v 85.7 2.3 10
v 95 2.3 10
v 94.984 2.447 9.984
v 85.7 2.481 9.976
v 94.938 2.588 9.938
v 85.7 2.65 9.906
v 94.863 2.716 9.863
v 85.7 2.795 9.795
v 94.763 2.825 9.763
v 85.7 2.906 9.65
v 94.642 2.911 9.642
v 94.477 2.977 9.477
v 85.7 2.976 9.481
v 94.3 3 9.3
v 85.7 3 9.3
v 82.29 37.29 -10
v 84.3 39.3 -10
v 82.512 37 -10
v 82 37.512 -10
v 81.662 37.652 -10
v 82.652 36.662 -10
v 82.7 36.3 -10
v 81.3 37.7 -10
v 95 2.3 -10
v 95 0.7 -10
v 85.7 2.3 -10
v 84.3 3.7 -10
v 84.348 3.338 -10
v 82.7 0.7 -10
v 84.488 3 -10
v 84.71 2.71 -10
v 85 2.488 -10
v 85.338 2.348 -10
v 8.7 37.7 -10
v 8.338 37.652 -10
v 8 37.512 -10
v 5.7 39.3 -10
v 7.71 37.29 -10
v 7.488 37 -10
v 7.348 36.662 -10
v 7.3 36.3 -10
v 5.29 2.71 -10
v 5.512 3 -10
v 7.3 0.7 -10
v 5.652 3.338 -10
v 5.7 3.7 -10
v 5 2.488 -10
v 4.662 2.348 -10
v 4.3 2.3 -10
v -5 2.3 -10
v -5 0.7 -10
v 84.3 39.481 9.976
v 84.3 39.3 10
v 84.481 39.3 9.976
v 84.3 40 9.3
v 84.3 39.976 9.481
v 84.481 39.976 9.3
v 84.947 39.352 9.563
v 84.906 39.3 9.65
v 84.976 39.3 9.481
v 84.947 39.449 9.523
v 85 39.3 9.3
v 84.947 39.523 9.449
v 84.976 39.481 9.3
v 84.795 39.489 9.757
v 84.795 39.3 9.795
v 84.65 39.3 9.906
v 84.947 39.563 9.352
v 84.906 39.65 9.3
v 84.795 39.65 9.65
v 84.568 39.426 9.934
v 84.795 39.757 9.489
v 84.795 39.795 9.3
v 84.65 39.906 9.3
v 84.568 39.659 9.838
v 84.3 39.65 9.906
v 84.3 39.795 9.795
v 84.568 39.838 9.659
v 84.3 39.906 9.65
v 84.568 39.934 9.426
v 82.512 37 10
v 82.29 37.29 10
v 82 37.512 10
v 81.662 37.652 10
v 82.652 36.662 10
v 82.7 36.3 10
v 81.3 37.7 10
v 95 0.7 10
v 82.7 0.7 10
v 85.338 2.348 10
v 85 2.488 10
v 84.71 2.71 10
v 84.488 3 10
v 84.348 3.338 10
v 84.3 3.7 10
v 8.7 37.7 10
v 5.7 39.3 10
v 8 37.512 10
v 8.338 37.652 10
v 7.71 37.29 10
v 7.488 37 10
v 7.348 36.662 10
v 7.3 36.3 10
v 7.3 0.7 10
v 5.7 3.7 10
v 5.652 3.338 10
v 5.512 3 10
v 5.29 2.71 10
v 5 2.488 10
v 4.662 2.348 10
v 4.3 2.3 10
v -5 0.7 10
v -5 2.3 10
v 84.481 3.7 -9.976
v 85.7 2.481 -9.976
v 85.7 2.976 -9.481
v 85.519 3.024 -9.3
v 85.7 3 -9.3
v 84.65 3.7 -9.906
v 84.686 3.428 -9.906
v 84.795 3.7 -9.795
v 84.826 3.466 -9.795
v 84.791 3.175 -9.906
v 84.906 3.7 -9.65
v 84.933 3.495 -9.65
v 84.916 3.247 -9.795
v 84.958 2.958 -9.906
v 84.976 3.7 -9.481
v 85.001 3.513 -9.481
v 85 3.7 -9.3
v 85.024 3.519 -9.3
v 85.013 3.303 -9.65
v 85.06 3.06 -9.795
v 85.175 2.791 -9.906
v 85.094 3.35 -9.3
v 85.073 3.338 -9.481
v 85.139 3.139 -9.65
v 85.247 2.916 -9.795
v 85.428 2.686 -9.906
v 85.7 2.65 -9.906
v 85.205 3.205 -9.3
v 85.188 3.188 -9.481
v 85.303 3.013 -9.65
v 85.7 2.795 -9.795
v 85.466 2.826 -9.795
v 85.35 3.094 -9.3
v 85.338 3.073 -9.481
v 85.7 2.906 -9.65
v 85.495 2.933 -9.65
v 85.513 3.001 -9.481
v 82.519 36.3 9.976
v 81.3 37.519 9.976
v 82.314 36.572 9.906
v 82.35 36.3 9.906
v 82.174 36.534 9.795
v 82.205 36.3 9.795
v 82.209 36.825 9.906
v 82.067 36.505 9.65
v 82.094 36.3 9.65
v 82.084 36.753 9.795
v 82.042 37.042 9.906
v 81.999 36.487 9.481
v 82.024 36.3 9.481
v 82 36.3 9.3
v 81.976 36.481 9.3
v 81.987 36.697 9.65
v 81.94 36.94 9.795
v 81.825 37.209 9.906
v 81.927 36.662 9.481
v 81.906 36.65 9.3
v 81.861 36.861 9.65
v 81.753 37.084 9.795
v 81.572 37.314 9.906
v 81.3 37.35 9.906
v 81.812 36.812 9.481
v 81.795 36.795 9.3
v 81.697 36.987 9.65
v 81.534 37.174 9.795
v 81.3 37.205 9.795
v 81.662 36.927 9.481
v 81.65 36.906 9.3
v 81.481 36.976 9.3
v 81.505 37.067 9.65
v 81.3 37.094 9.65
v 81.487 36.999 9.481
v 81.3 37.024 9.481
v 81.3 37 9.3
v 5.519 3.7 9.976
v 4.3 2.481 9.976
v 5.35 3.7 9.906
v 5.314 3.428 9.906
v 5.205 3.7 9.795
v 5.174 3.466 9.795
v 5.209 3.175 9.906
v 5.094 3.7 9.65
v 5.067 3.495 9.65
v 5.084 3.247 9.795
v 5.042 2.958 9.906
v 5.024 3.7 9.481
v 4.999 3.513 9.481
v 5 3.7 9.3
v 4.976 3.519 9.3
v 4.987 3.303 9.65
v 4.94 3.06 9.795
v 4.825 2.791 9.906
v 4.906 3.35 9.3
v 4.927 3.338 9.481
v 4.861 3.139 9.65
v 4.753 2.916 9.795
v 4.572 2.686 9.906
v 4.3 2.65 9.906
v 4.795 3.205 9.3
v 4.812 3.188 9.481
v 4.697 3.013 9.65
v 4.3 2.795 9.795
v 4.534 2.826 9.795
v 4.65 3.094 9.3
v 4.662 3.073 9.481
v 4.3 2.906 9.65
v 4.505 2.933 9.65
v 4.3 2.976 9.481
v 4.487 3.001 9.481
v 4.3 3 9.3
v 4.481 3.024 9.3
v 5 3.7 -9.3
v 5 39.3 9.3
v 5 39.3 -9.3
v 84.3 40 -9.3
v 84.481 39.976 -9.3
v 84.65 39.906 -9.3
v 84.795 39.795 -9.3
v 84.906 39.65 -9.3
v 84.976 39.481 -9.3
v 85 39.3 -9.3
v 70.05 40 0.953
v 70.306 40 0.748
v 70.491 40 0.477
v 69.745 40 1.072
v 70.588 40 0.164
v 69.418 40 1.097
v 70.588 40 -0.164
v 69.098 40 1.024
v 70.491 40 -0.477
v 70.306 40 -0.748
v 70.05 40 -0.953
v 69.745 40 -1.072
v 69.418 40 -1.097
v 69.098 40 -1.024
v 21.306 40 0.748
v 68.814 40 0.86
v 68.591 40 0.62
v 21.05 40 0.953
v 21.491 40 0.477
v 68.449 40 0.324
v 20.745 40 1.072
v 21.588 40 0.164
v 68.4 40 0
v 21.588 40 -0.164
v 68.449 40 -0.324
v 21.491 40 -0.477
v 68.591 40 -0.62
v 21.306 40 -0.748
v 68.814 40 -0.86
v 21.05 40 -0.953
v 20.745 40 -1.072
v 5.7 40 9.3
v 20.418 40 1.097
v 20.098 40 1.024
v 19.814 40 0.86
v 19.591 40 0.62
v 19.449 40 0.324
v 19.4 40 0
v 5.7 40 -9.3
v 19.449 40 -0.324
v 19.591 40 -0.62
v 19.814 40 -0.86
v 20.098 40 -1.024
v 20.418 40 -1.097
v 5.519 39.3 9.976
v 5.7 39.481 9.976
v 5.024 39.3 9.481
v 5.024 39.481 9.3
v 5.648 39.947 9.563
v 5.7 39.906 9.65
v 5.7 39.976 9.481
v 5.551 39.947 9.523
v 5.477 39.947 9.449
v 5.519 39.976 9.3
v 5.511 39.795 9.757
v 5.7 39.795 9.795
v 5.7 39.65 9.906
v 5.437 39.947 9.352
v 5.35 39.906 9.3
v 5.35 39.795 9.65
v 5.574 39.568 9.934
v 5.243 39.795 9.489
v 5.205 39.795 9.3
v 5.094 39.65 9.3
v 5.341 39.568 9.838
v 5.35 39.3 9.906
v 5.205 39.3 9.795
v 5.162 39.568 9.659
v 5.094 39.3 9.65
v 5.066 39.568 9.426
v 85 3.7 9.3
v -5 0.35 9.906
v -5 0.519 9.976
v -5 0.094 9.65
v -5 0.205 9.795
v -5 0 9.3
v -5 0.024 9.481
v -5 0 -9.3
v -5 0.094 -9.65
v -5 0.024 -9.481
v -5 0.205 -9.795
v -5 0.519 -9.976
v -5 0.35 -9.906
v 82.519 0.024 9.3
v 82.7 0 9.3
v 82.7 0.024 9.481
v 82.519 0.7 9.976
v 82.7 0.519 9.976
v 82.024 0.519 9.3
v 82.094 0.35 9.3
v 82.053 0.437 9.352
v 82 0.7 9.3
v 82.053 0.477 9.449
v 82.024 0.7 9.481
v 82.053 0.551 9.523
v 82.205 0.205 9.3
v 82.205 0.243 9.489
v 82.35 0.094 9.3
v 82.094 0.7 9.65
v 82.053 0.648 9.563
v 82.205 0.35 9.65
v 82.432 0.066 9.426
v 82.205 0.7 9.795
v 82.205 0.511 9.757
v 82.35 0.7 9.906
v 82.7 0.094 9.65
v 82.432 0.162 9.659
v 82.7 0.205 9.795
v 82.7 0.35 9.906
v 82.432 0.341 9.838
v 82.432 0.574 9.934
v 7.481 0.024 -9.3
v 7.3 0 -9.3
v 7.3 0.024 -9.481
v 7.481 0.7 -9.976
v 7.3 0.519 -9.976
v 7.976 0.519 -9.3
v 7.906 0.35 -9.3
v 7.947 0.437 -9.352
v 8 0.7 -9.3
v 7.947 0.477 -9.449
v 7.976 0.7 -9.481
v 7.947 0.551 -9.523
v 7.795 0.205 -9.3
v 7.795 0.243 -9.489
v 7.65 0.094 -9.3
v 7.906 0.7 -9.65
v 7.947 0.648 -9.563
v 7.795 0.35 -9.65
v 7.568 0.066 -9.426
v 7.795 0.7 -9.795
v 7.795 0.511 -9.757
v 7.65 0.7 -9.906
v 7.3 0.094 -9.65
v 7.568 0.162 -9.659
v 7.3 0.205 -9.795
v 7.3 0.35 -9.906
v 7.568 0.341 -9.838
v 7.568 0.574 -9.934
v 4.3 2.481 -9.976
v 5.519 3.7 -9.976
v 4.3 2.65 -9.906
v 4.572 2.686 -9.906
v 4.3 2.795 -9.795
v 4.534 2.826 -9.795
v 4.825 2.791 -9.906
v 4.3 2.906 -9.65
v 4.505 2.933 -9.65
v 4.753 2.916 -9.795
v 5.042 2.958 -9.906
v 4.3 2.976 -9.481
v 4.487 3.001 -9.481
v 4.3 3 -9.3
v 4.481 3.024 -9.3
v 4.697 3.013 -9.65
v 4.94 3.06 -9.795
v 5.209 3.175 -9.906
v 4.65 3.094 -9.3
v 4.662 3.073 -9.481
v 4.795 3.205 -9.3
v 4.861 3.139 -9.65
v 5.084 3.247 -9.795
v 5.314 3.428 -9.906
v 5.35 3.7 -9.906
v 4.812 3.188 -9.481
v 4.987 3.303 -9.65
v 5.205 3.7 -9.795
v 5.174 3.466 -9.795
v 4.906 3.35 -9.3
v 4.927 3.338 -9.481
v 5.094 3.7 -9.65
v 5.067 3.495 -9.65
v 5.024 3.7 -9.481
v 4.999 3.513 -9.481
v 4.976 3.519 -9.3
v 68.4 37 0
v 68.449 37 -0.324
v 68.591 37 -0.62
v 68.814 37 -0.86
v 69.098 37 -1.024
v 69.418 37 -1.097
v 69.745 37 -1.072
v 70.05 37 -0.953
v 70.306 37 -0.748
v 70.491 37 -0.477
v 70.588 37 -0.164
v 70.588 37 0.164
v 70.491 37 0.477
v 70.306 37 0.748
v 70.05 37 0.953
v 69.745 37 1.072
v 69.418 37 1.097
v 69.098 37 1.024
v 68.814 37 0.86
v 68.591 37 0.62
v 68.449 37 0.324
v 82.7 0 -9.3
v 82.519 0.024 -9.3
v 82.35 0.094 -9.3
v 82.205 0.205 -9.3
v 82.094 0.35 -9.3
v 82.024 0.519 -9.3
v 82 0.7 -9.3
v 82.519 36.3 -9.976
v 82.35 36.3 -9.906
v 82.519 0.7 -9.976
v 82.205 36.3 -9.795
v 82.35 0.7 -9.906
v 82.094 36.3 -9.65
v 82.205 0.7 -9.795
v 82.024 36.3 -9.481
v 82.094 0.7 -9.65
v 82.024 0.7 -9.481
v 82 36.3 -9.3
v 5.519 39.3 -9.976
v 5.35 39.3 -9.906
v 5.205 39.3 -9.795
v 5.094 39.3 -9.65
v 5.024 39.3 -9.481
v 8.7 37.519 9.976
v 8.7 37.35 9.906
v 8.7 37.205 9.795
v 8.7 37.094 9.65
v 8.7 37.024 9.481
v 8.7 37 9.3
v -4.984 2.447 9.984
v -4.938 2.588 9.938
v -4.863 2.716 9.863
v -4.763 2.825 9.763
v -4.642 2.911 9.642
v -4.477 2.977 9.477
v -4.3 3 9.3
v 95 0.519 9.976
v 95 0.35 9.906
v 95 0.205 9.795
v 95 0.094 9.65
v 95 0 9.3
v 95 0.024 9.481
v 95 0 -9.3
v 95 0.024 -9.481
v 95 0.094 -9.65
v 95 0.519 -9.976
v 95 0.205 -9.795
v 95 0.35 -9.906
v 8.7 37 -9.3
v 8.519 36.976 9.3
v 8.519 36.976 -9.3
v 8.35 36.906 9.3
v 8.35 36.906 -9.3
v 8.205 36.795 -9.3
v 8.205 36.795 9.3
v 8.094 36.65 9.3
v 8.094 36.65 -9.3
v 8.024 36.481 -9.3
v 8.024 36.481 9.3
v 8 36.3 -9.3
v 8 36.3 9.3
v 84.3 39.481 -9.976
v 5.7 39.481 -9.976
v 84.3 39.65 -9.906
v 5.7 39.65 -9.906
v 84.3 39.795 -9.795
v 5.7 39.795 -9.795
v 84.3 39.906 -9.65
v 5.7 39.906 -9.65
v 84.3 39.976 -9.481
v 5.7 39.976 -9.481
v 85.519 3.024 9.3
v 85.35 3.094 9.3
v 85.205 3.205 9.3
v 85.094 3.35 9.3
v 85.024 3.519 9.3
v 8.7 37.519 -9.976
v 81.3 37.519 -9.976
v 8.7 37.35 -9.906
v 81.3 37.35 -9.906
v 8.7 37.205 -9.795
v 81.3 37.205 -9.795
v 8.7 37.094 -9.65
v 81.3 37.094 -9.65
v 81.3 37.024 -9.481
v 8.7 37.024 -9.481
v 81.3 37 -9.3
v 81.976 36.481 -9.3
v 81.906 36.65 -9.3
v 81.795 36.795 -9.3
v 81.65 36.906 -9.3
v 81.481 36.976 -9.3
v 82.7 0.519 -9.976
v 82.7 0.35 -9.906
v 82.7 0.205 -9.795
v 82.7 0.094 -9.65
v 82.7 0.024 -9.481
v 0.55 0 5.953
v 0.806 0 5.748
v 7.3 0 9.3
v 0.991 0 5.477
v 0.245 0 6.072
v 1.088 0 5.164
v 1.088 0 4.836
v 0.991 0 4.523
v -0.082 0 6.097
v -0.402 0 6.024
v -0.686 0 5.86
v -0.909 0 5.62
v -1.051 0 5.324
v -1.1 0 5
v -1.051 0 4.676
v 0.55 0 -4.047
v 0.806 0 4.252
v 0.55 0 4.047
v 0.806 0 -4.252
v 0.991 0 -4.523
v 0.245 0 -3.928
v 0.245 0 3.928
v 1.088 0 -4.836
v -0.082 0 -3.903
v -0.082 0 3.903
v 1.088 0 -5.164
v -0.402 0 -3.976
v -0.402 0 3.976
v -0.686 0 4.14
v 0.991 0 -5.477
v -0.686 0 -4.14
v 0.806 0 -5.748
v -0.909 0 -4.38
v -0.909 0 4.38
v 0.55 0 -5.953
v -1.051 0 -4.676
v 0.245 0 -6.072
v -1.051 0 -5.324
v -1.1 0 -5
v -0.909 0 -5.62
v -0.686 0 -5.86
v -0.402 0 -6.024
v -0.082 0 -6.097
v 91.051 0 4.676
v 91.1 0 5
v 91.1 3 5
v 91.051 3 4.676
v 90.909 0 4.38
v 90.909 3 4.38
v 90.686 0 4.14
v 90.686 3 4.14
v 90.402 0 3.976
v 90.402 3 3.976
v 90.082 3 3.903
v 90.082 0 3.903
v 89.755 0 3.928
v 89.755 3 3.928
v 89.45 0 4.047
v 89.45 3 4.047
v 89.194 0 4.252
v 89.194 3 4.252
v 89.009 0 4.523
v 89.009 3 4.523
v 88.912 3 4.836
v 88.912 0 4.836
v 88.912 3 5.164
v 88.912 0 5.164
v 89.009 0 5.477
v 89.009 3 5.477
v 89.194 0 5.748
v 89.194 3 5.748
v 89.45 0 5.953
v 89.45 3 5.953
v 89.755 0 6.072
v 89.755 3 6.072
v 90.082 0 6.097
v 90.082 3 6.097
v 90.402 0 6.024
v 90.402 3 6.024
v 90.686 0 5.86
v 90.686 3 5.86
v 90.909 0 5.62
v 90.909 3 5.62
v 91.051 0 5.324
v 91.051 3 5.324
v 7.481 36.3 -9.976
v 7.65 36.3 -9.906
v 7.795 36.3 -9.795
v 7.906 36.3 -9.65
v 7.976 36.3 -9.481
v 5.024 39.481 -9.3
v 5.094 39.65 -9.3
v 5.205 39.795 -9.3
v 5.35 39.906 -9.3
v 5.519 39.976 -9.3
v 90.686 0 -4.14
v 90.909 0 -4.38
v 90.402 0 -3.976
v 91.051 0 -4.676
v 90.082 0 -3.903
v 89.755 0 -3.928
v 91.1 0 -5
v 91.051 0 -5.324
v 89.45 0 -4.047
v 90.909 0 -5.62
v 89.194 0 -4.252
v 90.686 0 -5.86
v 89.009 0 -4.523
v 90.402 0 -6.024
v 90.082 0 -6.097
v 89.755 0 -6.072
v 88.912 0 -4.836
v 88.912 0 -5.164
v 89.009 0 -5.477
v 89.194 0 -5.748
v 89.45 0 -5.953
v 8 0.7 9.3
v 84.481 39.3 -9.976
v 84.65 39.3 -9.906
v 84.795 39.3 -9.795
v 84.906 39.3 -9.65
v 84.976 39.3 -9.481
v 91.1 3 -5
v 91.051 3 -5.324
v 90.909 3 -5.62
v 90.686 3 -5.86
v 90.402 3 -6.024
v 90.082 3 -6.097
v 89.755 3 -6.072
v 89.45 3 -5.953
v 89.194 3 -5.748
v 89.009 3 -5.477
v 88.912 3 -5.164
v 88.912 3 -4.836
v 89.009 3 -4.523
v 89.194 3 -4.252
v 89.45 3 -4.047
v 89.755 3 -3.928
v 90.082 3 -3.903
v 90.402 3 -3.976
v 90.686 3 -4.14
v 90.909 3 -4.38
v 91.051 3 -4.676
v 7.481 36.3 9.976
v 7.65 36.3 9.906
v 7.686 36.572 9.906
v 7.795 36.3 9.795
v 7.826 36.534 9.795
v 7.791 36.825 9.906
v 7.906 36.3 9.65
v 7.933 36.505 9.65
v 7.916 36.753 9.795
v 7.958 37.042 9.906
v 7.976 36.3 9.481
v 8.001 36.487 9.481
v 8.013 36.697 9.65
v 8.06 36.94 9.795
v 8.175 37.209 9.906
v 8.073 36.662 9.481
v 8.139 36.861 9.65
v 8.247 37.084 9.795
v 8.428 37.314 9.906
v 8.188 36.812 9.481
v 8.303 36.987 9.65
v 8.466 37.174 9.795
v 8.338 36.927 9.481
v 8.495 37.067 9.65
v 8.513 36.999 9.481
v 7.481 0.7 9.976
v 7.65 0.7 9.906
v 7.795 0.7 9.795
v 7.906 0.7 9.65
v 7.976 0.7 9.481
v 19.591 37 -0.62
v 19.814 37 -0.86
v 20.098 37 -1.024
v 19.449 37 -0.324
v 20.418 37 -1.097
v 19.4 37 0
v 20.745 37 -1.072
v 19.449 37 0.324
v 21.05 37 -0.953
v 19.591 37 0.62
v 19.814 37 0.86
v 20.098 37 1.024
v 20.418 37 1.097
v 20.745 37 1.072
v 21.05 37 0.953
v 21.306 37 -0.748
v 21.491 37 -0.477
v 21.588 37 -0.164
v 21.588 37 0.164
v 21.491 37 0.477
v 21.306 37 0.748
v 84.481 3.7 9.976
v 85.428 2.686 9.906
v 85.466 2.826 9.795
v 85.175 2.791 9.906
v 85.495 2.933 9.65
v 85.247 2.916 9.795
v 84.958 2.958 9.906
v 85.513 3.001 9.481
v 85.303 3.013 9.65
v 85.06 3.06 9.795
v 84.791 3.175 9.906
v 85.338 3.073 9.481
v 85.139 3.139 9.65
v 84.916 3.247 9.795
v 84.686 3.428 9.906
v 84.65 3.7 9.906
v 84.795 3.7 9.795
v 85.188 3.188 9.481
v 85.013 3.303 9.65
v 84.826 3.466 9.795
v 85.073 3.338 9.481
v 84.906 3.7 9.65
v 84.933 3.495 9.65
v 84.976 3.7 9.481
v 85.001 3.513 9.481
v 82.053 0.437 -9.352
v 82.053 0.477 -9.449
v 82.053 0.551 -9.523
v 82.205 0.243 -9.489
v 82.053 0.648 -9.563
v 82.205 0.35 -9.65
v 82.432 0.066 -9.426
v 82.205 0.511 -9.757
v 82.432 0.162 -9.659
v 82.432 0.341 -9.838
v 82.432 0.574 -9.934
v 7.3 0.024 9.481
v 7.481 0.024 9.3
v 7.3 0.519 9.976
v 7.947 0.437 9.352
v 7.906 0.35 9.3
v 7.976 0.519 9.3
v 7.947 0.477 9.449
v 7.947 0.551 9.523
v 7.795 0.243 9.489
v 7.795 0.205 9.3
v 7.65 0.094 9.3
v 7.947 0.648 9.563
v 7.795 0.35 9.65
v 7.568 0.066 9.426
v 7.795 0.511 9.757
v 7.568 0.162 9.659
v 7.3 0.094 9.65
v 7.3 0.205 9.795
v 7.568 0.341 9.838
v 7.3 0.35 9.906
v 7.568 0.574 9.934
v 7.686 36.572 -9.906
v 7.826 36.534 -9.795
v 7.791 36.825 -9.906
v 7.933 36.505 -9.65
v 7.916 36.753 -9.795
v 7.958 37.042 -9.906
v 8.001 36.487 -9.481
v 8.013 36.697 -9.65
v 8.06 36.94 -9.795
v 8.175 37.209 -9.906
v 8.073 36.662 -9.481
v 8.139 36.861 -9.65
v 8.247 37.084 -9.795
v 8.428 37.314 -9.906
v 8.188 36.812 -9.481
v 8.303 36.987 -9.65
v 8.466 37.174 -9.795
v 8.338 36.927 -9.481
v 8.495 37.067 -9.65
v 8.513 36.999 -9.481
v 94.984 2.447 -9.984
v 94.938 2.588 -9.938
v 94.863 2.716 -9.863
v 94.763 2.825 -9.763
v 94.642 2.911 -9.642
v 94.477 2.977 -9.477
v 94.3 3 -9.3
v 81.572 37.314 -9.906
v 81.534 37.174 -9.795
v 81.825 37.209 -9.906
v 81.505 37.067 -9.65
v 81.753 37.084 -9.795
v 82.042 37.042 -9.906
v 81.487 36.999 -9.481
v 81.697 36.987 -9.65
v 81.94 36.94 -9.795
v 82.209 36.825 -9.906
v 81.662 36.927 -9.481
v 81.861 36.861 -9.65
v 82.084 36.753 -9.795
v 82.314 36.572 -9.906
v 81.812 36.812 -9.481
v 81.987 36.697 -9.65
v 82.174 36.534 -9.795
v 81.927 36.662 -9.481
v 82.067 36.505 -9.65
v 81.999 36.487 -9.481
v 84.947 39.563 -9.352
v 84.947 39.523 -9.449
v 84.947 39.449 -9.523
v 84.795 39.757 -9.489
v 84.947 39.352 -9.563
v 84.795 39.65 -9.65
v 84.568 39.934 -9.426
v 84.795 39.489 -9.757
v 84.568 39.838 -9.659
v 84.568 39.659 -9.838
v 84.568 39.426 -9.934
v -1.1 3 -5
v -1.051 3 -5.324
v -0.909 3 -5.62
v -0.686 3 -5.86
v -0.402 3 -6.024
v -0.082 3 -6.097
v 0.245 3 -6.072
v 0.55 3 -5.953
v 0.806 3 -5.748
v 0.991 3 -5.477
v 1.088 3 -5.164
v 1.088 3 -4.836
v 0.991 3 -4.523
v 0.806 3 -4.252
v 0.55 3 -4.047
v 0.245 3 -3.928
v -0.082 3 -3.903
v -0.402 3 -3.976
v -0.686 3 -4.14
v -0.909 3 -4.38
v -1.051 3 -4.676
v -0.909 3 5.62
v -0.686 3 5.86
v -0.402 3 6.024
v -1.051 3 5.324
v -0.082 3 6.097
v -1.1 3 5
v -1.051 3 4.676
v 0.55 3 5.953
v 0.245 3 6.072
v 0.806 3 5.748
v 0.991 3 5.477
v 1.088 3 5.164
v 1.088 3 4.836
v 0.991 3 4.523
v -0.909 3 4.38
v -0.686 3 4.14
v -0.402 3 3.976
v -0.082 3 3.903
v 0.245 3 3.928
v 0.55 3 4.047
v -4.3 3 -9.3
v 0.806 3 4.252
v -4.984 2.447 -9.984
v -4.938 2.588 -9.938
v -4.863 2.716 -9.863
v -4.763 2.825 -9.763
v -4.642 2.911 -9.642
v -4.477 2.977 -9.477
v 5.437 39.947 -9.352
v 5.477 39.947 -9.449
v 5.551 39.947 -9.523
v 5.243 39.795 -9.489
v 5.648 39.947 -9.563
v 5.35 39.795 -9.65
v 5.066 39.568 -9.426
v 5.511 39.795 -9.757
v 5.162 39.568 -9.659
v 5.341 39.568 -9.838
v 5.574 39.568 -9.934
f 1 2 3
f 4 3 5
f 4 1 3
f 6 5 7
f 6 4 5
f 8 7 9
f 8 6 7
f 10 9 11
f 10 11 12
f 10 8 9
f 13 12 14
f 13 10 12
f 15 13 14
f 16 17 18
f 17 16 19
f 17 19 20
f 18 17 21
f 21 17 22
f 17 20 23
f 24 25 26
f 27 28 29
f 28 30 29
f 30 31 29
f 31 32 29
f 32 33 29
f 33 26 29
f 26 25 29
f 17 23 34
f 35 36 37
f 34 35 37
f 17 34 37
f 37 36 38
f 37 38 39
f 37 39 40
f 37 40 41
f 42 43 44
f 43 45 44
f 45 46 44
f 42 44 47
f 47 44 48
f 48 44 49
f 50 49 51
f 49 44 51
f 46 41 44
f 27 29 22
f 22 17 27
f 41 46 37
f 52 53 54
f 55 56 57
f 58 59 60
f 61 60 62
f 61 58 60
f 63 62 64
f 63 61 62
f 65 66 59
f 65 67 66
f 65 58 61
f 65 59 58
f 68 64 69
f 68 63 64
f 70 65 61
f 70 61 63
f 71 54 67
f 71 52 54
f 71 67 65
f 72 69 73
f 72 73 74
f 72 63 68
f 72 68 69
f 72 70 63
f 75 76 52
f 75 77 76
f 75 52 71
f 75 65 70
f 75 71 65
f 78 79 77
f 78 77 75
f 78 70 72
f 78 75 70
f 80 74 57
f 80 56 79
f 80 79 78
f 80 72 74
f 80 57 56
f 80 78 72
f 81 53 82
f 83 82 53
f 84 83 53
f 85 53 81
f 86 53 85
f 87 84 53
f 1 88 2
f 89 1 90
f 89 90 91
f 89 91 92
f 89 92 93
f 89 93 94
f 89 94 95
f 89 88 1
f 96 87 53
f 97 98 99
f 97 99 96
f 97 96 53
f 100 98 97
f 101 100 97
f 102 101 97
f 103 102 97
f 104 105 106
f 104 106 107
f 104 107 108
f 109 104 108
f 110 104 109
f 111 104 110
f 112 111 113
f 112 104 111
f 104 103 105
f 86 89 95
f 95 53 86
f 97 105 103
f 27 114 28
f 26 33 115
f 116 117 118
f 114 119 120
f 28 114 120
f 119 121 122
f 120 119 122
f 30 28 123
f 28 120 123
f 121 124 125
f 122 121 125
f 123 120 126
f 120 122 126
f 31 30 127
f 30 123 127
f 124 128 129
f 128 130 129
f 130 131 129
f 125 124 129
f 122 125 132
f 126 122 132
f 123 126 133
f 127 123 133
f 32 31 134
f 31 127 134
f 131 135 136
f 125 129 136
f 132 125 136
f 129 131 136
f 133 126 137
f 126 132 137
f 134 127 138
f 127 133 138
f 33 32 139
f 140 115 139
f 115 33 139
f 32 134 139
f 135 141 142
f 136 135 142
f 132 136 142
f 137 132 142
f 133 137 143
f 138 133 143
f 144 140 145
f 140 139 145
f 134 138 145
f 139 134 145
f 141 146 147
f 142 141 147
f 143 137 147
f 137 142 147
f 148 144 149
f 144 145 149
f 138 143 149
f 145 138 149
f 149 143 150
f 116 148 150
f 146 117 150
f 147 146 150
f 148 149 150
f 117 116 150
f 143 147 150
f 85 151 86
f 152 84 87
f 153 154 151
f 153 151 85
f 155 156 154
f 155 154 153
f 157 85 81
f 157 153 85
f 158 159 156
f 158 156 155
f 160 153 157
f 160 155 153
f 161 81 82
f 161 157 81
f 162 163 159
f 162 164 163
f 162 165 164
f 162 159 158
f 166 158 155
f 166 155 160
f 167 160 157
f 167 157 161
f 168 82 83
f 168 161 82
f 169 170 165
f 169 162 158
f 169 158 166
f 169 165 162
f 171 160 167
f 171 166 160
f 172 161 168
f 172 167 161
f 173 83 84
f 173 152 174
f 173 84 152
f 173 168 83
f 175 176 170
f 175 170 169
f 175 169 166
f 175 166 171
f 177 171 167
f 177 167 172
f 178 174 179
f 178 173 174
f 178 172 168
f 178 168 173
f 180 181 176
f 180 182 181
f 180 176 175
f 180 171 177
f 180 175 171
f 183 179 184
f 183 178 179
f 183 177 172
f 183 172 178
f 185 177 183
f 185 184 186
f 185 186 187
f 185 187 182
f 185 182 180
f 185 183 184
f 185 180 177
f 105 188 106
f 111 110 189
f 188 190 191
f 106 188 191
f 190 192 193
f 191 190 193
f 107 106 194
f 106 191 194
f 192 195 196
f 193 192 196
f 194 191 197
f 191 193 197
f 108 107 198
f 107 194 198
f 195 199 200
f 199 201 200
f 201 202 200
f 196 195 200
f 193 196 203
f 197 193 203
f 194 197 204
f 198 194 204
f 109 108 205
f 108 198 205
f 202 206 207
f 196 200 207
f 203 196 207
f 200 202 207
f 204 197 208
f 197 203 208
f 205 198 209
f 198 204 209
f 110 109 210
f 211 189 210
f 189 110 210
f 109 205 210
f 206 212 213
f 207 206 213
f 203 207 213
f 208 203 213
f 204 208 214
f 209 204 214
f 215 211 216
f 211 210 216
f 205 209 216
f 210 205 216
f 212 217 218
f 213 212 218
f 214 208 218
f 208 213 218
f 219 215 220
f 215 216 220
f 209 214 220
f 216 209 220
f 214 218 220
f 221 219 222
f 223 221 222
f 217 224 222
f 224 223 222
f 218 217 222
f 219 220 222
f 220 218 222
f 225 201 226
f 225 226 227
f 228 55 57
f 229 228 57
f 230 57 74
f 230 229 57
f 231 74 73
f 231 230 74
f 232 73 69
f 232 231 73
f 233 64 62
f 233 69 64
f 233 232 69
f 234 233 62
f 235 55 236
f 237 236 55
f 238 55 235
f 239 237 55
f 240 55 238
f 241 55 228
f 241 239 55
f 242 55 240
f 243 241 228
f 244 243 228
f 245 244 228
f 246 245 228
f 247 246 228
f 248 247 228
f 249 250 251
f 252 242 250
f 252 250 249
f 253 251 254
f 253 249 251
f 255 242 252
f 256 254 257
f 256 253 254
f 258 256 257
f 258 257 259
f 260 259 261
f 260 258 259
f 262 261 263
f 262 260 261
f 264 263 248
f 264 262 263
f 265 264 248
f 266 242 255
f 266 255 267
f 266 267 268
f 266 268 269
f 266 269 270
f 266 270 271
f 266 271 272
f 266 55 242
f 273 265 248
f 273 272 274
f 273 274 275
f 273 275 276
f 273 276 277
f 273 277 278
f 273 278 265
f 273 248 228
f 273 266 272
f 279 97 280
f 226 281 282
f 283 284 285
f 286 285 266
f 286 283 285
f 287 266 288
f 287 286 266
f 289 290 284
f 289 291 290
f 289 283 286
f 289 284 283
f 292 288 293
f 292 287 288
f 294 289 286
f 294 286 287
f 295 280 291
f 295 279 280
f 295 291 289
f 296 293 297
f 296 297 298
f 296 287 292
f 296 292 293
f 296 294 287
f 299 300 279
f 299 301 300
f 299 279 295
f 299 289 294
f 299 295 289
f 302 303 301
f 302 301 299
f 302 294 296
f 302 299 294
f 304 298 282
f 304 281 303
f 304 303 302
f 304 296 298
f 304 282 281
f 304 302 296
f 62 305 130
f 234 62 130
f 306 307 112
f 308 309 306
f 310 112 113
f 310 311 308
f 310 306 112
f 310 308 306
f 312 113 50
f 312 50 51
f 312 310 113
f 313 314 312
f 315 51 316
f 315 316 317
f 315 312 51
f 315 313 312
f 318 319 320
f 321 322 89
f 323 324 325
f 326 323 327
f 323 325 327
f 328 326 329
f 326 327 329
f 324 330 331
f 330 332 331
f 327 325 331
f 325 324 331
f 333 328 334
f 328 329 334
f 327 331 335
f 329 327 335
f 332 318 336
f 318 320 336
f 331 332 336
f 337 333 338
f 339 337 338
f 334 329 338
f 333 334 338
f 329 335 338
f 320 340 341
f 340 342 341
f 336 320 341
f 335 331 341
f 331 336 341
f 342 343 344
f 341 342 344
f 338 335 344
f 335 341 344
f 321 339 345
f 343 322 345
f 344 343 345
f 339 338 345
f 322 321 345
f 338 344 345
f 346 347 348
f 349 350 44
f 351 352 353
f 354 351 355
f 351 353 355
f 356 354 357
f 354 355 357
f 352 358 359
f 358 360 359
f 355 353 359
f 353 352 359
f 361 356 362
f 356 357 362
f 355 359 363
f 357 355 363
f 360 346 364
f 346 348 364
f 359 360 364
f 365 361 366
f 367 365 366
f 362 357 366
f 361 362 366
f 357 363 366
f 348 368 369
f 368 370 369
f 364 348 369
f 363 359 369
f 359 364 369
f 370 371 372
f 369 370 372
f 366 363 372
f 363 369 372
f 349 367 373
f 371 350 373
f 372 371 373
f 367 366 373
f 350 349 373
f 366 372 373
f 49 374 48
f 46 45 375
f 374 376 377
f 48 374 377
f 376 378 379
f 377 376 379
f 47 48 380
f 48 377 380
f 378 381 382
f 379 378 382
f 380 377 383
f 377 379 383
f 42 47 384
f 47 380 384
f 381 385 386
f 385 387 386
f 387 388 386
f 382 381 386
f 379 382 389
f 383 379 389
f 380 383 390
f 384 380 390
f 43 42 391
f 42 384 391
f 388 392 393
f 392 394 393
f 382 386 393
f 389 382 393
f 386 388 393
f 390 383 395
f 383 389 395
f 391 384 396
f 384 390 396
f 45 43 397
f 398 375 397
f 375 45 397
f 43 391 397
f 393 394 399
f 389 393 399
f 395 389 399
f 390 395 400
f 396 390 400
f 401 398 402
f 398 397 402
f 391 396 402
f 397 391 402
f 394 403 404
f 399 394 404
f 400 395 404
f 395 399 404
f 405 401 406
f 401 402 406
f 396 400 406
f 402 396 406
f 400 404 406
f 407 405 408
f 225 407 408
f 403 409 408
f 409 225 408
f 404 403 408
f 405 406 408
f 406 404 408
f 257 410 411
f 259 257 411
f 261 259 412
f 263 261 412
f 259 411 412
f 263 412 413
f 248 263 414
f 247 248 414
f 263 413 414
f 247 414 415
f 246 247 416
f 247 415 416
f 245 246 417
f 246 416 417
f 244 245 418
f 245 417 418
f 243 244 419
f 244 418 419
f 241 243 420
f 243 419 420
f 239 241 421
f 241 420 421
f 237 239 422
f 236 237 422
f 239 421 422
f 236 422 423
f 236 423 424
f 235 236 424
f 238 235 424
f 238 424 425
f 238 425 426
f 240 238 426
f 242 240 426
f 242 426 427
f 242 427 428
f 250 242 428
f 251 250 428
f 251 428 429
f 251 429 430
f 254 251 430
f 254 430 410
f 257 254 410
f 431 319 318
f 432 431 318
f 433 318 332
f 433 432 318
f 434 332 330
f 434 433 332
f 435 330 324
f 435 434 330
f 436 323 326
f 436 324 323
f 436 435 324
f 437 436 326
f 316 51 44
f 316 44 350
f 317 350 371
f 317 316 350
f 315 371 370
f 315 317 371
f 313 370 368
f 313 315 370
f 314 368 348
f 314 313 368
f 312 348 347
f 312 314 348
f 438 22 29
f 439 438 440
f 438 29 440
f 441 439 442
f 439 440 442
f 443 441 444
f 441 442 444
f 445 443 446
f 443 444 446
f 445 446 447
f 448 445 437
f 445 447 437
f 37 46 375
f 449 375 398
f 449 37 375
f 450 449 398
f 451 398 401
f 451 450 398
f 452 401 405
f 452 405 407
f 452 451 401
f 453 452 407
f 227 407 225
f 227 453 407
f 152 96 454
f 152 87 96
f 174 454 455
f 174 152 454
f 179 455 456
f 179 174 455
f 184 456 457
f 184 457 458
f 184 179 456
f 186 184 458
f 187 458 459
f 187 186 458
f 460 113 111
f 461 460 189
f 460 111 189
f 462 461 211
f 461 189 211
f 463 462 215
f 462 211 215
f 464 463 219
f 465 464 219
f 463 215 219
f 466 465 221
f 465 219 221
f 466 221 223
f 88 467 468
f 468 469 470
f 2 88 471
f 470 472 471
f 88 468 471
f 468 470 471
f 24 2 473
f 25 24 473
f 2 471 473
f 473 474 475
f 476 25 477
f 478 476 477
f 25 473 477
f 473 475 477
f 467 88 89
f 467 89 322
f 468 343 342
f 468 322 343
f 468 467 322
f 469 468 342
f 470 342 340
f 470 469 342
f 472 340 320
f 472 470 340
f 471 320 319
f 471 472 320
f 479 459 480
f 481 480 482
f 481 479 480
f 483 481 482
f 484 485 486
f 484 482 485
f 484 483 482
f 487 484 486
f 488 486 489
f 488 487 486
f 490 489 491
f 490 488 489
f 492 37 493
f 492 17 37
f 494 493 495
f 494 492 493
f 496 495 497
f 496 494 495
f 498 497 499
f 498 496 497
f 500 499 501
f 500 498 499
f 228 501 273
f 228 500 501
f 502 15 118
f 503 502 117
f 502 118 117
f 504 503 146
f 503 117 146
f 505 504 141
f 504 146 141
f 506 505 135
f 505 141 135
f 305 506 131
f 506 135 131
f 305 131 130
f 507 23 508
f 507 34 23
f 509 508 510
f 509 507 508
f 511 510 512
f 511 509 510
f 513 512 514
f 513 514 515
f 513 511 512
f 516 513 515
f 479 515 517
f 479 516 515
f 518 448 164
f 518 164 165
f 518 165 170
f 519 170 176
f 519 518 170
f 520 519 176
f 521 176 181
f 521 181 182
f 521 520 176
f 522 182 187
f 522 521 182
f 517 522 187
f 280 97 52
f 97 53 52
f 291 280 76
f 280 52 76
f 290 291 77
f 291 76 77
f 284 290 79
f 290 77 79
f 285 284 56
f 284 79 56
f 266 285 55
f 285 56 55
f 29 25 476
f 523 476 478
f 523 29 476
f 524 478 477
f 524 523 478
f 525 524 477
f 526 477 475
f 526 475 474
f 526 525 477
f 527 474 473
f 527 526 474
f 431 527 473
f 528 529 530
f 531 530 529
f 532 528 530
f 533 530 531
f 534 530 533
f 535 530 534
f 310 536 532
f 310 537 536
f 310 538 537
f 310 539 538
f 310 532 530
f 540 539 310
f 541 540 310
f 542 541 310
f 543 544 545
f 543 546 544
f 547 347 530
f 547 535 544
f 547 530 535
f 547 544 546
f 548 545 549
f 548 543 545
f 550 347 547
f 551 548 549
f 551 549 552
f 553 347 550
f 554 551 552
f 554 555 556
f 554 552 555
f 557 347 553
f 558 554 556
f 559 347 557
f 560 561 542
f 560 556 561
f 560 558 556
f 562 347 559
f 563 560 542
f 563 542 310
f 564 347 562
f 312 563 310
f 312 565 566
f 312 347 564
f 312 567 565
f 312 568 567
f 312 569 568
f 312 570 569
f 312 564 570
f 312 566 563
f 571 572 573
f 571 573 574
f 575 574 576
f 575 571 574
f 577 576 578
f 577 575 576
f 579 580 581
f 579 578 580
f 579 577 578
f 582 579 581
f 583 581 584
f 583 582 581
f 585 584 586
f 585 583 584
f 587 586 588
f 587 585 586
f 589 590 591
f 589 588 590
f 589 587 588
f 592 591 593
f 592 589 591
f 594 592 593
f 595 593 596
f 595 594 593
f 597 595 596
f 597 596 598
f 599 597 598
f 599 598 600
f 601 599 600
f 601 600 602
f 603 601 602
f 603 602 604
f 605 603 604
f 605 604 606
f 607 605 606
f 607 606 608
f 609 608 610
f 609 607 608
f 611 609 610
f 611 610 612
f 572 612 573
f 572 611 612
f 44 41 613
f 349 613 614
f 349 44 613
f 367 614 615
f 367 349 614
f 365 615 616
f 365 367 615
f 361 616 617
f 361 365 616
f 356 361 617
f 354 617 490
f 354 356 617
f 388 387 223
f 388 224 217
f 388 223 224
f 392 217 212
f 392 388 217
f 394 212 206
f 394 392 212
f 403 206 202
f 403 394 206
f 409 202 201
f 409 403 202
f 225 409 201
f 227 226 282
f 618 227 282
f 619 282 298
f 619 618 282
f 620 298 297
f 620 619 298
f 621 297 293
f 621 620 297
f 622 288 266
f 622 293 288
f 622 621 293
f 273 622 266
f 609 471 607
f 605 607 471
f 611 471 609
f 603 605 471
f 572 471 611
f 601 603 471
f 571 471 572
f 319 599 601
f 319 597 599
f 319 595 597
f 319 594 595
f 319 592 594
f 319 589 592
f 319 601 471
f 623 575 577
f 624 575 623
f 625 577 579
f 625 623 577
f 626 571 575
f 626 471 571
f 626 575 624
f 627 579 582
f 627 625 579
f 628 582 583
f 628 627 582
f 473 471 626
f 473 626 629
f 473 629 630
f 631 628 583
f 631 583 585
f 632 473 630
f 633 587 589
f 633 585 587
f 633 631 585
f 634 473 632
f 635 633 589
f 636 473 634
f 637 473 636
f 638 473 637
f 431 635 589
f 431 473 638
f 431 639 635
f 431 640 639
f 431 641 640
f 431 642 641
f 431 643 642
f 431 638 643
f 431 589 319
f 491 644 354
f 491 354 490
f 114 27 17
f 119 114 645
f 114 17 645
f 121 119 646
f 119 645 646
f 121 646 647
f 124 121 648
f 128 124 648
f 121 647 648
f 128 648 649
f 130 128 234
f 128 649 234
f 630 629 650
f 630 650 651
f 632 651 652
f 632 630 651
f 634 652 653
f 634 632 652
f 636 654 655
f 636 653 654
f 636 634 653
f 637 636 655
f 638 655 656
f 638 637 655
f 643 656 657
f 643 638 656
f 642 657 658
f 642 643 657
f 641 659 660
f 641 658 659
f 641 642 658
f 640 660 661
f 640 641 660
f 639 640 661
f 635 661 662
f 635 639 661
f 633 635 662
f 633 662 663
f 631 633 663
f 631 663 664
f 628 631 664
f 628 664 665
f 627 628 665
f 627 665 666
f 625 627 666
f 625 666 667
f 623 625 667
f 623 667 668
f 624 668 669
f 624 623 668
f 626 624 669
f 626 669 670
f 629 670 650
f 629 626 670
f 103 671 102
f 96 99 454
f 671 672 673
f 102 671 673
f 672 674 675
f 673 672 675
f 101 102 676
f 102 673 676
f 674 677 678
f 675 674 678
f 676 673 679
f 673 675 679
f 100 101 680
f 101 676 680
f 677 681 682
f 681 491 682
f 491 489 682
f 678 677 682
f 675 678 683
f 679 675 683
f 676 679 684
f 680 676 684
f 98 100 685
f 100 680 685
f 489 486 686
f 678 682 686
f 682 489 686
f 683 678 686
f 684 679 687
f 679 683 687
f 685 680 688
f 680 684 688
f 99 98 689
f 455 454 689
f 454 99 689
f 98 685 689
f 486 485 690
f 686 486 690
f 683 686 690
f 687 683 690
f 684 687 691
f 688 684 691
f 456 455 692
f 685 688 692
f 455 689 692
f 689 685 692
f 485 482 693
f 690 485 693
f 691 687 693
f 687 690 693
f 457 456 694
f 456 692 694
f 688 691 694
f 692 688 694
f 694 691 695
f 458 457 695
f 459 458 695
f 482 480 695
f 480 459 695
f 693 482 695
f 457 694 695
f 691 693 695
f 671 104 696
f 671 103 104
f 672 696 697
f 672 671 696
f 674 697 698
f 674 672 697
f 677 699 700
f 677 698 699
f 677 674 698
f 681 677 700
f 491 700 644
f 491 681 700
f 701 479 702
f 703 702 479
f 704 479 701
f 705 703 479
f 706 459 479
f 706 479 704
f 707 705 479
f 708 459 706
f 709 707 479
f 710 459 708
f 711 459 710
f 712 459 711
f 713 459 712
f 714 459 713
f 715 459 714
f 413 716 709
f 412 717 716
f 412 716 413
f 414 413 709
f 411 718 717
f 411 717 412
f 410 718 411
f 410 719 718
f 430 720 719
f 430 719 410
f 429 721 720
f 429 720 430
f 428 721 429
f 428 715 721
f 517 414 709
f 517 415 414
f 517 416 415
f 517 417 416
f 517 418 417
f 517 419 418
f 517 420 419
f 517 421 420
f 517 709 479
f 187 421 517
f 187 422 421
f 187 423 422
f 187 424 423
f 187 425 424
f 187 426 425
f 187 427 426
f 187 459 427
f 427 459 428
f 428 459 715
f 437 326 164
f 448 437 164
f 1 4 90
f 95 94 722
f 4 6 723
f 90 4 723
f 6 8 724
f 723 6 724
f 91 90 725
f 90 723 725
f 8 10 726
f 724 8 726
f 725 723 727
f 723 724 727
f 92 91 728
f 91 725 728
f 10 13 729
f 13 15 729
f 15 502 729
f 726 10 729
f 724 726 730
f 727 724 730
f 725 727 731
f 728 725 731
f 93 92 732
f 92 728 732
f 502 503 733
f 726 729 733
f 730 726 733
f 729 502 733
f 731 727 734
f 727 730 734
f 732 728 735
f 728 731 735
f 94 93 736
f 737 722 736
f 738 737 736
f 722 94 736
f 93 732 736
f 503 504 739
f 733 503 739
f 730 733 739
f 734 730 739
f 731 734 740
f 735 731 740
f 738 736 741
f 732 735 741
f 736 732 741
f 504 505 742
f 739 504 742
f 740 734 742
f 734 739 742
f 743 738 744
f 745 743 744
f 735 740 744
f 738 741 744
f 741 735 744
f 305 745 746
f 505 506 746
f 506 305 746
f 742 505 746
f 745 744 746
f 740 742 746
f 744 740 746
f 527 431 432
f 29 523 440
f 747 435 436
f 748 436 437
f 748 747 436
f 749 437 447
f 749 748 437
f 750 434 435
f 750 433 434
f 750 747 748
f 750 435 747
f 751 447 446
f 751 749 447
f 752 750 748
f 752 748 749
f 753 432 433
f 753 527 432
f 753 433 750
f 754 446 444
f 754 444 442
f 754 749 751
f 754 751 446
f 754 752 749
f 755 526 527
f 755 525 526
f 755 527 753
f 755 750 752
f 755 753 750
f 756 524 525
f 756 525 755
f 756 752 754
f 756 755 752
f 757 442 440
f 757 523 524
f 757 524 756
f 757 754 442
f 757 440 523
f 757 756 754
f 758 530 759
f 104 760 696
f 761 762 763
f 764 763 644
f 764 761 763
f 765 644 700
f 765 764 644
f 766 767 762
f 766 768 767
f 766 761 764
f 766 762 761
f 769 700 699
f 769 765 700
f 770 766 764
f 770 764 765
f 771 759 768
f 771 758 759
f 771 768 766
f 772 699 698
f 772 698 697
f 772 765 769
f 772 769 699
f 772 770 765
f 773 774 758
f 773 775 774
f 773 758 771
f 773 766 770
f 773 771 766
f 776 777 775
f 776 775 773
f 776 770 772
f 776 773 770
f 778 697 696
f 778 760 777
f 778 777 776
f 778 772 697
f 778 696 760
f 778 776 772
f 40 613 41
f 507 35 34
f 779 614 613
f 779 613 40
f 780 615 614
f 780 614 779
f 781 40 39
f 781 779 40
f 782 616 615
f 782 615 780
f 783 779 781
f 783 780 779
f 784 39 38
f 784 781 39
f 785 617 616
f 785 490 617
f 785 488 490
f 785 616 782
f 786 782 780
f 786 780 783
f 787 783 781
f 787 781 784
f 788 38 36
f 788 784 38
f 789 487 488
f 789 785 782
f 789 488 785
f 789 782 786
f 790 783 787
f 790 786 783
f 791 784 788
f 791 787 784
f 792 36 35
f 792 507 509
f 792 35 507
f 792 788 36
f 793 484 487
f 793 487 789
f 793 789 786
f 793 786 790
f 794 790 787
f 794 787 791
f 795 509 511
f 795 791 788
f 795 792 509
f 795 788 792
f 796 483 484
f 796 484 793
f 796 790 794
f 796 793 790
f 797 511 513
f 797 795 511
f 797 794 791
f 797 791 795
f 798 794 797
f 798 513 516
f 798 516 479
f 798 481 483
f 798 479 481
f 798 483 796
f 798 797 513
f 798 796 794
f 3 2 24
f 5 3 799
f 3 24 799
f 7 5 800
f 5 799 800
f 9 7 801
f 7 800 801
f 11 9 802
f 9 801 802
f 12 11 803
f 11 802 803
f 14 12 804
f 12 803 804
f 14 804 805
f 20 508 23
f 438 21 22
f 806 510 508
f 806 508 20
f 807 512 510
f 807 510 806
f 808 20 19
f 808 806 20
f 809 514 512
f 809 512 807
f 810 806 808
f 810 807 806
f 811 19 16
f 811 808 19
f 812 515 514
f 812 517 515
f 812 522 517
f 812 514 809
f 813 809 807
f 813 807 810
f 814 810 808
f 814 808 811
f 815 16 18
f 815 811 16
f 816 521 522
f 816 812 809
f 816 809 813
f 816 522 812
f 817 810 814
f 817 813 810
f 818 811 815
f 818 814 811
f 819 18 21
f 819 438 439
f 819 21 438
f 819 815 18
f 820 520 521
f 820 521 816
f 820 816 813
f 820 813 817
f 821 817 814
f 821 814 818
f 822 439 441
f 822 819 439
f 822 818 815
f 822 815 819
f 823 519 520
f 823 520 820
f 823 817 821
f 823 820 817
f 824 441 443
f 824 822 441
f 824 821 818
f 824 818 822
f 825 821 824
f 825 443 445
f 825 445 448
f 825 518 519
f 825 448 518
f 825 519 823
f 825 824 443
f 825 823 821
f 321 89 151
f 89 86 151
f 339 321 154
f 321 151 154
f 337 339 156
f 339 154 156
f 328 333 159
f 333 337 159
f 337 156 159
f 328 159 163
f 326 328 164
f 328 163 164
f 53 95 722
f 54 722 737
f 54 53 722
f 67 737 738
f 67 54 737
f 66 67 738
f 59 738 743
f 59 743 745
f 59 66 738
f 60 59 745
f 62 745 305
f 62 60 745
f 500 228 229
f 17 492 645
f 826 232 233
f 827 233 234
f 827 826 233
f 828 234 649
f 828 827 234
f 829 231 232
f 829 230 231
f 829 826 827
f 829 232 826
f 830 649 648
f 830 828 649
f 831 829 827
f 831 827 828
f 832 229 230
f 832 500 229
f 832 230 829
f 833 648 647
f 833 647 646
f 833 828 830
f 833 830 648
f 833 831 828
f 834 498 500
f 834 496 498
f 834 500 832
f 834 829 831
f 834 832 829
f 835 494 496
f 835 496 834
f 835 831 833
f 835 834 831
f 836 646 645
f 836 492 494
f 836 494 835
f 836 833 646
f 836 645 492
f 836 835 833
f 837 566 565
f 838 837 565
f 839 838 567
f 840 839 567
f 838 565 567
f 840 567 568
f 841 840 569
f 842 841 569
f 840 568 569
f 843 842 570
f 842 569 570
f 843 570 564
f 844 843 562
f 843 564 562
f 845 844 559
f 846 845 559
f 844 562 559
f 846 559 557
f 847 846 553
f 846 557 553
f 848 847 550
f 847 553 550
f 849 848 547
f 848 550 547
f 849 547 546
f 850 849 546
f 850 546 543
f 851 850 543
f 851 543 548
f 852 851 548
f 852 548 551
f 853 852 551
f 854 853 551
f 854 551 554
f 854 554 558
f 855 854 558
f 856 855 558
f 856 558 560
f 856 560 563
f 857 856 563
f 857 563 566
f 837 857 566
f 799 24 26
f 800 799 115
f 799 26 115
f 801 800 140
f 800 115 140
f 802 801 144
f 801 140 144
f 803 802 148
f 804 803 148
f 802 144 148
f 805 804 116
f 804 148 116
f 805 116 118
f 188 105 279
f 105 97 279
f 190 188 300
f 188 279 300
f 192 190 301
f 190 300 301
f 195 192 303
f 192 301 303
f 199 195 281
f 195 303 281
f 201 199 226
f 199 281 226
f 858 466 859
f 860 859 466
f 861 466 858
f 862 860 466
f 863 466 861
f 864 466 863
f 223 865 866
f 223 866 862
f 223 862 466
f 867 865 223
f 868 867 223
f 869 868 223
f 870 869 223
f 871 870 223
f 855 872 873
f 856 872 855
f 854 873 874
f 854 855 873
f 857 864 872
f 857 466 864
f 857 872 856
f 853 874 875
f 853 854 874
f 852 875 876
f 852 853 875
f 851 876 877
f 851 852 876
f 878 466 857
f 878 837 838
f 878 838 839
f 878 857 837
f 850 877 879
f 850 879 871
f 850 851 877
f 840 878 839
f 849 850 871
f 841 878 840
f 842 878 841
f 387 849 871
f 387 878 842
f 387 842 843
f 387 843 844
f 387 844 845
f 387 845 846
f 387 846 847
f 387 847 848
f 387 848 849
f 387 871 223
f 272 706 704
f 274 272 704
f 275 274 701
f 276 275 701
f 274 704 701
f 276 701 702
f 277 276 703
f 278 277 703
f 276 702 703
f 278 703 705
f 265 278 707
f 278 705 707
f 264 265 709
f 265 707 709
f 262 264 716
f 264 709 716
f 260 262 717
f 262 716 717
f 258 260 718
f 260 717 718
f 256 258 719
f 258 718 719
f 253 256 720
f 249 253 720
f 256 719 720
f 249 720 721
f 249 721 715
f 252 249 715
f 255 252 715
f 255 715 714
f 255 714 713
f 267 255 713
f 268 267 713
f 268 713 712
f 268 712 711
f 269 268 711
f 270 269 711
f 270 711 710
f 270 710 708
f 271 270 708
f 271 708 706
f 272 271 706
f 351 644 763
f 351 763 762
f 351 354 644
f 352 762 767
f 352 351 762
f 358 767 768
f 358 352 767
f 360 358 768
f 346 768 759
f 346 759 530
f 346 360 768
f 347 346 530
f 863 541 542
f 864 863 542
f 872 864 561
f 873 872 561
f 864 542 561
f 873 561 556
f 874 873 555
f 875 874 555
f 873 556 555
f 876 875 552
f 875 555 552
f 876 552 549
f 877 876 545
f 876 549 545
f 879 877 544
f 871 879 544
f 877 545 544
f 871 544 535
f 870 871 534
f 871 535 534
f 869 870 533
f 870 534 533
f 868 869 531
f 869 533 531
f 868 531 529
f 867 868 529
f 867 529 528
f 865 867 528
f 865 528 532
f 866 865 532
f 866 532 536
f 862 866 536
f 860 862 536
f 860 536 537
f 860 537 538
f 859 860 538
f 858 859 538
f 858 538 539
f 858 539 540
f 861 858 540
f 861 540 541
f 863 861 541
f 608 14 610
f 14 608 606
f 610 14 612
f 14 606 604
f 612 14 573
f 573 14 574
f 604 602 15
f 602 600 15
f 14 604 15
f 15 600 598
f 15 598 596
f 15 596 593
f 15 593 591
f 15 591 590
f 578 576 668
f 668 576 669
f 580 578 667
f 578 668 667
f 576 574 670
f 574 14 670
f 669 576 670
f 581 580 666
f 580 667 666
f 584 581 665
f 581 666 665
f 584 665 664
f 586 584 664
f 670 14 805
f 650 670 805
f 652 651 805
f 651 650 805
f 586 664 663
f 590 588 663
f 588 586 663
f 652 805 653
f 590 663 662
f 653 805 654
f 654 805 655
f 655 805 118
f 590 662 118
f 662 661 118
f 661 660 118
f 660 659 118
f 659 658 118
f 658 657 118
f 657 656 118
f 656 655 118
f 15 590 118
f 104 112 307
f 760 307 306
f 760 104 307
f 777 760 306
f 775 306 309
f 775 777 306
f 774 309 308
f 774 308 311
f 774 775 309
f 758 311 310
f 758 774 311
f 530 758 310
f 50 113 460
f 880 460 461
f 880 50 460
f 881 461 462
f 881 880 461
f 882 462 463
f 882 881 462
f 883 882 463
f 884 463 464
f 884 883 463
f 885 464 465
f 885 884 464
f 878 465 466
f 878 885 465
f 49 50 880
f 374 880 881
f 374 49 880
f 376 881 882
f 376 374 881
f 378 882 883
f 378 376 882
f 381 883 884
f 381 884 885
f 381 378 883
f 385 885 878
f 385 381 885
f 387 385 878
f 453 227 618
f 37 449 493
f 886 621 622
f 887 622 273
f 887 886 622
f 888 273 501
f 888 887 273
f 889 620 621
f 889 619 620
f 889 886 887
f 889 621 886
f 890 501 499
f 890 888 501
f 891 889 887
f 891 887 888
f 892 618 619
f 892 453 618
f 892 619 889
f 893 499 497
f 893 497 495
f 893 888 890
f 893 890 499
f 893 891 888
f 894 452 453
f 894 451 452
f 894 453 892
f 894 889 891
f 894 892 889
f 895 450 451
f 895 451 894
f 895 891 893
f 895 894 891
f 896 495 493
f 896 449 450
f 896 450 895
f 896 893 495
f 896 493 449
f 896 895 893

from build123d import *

# Parameters (mm, degrees)
SKETCH_1_W              = 10
SKETCH_1_H              = 20
EXTRUDE_1_DEPTH         = 3
HOLE_WIZARD_2_2_2_2_1_D = 2.2
SKETCH_5_W              = 20
SKETCH_5_H              = 40
EXTRUDE_2_DEPTH         = 80
CUT_EXTRUDE_1_REACH     = 107
SKETCH_6_W              = 74
SKETCH_6_H              = 37
HOLE_WIZARD_2_2_2_2_2_D = 2.2
FILLET_1_R              = 0.7


with BuildPart() as part:
    # 草图1 → 凸台-拉伸1 (new body)
    with BuildSketch(Plane(origin=(0, 0, 0), x_dir=(1, 0, 0), z_dir=(0, 1, 0))):
        Rectangle(SKETCH_1_W, SKETCH_1_H)
    extrude_1 = extrude(amount=EXTRUDE_1_DEPTH)

    # Ø2.2 (2.2) 直径孔1 (through all)
    with Locations(Plane(origin=(0, 3, 0), x_dir=(1, 0, 0), z_dir=(0, 1, 0))):
        with Locations((0, 5), (0, -5)):
            hole_wizard_2_2_2_2_1 = Hole(HOLE_WIZARD_2_2_2_2_1_D / 2)

    # 草图5 → 凸台-拉伸2 (add)
    with BuildSketch(Plane(origin=(5, 0, 0), x_dir=(0, 0, -1), z_dir=(1, 0, 0))):
        with Locations((0, 20)):
            Rectangle(SKETCH_5_W, SKETCH_5_H)
    extrude(amount=EXTRUDE_2_DEPTH)

    # 镜向1: 凸台-拉伸1, Ø2.2 (2.2) 直径孔1 across plane
    add(extrude_1.mirror(Plane.ZY.offset(-45)))
    add(hole_wizard_2_2_2_2_1.mirror(Plane.ZY.offset(-45)), mode=Mode.SUBTRACT)

    # 草图6 → 切除-拉伸1 (cut, up to next)
    with BuildSketch(Plane.XY.offset(10), mode=Mode.PRIVATE) as cut_extrude_1_sk1:
        with Locations((45, 18.5)):
            Rectangle(SKETCH_6_W, SKETCH_6_H)
    cut_extrude_1_tool1 = extrude(cut_extrude_1_sk1.sketch, amount=-CUT_EXTRUDE_1_REACH, mode=Mode.PRIVATE) & part.part
    add(cut_extrude_1_tool1.solids().sort_by_distance((45, 18.5, 10))[0], mode=Mode.SUBTRACT)

    # Ø2.2 (2.2) 直径孔2 (through all)
    with Locations(Plane(origin=(0, 40, 0), x_dir=(1, 0, 0), z_dir=(0, 1, 0))):
        with Locations((20.5, 0), (69.5, 0)):
            Hole(HOLE_WIZARD_2_2_2_2_2_D / 2)

    # 圆角1
    fillet_1_edges = [part.edges().sort_by_distance(p)[0] for p in [
        (5, 3, 0),
        (0, 3, -10),
        (5, 21.5, 10),
        (45, 40, 10),
        (5, 21.5, -10),
        (5, 40, 0),
        (45, 40, -10),
        (85, 21.5, 10),
        (85, 40, 0),
        (85, 21.5, -10),
        (95, 3, 0),
        (90, 3, -10),
        (85, 3, 0),
        (90, 3, 10),
        (-5, 3, 0),
        (88.5, 0, -10),
        (1.5, 0, 10),
        (1.5, 0, -10),
        (88.5, 0, 10),
        (8, 0, 0),
        (8, 37, 0),
        (82, 37, 0),
        (82, 0, 0),
        (8, 18.5, 10),
        (82, 18.5, 10),
        (45, 37, 10),
        (8, 18.5, -10),
        (45, 37, -10),
        (82, 18.5, -10),
        (0, 3, 10),
    ]]
    fillet(fillet_1_edges, radius=FILLET_1_R)


solid = part.part
